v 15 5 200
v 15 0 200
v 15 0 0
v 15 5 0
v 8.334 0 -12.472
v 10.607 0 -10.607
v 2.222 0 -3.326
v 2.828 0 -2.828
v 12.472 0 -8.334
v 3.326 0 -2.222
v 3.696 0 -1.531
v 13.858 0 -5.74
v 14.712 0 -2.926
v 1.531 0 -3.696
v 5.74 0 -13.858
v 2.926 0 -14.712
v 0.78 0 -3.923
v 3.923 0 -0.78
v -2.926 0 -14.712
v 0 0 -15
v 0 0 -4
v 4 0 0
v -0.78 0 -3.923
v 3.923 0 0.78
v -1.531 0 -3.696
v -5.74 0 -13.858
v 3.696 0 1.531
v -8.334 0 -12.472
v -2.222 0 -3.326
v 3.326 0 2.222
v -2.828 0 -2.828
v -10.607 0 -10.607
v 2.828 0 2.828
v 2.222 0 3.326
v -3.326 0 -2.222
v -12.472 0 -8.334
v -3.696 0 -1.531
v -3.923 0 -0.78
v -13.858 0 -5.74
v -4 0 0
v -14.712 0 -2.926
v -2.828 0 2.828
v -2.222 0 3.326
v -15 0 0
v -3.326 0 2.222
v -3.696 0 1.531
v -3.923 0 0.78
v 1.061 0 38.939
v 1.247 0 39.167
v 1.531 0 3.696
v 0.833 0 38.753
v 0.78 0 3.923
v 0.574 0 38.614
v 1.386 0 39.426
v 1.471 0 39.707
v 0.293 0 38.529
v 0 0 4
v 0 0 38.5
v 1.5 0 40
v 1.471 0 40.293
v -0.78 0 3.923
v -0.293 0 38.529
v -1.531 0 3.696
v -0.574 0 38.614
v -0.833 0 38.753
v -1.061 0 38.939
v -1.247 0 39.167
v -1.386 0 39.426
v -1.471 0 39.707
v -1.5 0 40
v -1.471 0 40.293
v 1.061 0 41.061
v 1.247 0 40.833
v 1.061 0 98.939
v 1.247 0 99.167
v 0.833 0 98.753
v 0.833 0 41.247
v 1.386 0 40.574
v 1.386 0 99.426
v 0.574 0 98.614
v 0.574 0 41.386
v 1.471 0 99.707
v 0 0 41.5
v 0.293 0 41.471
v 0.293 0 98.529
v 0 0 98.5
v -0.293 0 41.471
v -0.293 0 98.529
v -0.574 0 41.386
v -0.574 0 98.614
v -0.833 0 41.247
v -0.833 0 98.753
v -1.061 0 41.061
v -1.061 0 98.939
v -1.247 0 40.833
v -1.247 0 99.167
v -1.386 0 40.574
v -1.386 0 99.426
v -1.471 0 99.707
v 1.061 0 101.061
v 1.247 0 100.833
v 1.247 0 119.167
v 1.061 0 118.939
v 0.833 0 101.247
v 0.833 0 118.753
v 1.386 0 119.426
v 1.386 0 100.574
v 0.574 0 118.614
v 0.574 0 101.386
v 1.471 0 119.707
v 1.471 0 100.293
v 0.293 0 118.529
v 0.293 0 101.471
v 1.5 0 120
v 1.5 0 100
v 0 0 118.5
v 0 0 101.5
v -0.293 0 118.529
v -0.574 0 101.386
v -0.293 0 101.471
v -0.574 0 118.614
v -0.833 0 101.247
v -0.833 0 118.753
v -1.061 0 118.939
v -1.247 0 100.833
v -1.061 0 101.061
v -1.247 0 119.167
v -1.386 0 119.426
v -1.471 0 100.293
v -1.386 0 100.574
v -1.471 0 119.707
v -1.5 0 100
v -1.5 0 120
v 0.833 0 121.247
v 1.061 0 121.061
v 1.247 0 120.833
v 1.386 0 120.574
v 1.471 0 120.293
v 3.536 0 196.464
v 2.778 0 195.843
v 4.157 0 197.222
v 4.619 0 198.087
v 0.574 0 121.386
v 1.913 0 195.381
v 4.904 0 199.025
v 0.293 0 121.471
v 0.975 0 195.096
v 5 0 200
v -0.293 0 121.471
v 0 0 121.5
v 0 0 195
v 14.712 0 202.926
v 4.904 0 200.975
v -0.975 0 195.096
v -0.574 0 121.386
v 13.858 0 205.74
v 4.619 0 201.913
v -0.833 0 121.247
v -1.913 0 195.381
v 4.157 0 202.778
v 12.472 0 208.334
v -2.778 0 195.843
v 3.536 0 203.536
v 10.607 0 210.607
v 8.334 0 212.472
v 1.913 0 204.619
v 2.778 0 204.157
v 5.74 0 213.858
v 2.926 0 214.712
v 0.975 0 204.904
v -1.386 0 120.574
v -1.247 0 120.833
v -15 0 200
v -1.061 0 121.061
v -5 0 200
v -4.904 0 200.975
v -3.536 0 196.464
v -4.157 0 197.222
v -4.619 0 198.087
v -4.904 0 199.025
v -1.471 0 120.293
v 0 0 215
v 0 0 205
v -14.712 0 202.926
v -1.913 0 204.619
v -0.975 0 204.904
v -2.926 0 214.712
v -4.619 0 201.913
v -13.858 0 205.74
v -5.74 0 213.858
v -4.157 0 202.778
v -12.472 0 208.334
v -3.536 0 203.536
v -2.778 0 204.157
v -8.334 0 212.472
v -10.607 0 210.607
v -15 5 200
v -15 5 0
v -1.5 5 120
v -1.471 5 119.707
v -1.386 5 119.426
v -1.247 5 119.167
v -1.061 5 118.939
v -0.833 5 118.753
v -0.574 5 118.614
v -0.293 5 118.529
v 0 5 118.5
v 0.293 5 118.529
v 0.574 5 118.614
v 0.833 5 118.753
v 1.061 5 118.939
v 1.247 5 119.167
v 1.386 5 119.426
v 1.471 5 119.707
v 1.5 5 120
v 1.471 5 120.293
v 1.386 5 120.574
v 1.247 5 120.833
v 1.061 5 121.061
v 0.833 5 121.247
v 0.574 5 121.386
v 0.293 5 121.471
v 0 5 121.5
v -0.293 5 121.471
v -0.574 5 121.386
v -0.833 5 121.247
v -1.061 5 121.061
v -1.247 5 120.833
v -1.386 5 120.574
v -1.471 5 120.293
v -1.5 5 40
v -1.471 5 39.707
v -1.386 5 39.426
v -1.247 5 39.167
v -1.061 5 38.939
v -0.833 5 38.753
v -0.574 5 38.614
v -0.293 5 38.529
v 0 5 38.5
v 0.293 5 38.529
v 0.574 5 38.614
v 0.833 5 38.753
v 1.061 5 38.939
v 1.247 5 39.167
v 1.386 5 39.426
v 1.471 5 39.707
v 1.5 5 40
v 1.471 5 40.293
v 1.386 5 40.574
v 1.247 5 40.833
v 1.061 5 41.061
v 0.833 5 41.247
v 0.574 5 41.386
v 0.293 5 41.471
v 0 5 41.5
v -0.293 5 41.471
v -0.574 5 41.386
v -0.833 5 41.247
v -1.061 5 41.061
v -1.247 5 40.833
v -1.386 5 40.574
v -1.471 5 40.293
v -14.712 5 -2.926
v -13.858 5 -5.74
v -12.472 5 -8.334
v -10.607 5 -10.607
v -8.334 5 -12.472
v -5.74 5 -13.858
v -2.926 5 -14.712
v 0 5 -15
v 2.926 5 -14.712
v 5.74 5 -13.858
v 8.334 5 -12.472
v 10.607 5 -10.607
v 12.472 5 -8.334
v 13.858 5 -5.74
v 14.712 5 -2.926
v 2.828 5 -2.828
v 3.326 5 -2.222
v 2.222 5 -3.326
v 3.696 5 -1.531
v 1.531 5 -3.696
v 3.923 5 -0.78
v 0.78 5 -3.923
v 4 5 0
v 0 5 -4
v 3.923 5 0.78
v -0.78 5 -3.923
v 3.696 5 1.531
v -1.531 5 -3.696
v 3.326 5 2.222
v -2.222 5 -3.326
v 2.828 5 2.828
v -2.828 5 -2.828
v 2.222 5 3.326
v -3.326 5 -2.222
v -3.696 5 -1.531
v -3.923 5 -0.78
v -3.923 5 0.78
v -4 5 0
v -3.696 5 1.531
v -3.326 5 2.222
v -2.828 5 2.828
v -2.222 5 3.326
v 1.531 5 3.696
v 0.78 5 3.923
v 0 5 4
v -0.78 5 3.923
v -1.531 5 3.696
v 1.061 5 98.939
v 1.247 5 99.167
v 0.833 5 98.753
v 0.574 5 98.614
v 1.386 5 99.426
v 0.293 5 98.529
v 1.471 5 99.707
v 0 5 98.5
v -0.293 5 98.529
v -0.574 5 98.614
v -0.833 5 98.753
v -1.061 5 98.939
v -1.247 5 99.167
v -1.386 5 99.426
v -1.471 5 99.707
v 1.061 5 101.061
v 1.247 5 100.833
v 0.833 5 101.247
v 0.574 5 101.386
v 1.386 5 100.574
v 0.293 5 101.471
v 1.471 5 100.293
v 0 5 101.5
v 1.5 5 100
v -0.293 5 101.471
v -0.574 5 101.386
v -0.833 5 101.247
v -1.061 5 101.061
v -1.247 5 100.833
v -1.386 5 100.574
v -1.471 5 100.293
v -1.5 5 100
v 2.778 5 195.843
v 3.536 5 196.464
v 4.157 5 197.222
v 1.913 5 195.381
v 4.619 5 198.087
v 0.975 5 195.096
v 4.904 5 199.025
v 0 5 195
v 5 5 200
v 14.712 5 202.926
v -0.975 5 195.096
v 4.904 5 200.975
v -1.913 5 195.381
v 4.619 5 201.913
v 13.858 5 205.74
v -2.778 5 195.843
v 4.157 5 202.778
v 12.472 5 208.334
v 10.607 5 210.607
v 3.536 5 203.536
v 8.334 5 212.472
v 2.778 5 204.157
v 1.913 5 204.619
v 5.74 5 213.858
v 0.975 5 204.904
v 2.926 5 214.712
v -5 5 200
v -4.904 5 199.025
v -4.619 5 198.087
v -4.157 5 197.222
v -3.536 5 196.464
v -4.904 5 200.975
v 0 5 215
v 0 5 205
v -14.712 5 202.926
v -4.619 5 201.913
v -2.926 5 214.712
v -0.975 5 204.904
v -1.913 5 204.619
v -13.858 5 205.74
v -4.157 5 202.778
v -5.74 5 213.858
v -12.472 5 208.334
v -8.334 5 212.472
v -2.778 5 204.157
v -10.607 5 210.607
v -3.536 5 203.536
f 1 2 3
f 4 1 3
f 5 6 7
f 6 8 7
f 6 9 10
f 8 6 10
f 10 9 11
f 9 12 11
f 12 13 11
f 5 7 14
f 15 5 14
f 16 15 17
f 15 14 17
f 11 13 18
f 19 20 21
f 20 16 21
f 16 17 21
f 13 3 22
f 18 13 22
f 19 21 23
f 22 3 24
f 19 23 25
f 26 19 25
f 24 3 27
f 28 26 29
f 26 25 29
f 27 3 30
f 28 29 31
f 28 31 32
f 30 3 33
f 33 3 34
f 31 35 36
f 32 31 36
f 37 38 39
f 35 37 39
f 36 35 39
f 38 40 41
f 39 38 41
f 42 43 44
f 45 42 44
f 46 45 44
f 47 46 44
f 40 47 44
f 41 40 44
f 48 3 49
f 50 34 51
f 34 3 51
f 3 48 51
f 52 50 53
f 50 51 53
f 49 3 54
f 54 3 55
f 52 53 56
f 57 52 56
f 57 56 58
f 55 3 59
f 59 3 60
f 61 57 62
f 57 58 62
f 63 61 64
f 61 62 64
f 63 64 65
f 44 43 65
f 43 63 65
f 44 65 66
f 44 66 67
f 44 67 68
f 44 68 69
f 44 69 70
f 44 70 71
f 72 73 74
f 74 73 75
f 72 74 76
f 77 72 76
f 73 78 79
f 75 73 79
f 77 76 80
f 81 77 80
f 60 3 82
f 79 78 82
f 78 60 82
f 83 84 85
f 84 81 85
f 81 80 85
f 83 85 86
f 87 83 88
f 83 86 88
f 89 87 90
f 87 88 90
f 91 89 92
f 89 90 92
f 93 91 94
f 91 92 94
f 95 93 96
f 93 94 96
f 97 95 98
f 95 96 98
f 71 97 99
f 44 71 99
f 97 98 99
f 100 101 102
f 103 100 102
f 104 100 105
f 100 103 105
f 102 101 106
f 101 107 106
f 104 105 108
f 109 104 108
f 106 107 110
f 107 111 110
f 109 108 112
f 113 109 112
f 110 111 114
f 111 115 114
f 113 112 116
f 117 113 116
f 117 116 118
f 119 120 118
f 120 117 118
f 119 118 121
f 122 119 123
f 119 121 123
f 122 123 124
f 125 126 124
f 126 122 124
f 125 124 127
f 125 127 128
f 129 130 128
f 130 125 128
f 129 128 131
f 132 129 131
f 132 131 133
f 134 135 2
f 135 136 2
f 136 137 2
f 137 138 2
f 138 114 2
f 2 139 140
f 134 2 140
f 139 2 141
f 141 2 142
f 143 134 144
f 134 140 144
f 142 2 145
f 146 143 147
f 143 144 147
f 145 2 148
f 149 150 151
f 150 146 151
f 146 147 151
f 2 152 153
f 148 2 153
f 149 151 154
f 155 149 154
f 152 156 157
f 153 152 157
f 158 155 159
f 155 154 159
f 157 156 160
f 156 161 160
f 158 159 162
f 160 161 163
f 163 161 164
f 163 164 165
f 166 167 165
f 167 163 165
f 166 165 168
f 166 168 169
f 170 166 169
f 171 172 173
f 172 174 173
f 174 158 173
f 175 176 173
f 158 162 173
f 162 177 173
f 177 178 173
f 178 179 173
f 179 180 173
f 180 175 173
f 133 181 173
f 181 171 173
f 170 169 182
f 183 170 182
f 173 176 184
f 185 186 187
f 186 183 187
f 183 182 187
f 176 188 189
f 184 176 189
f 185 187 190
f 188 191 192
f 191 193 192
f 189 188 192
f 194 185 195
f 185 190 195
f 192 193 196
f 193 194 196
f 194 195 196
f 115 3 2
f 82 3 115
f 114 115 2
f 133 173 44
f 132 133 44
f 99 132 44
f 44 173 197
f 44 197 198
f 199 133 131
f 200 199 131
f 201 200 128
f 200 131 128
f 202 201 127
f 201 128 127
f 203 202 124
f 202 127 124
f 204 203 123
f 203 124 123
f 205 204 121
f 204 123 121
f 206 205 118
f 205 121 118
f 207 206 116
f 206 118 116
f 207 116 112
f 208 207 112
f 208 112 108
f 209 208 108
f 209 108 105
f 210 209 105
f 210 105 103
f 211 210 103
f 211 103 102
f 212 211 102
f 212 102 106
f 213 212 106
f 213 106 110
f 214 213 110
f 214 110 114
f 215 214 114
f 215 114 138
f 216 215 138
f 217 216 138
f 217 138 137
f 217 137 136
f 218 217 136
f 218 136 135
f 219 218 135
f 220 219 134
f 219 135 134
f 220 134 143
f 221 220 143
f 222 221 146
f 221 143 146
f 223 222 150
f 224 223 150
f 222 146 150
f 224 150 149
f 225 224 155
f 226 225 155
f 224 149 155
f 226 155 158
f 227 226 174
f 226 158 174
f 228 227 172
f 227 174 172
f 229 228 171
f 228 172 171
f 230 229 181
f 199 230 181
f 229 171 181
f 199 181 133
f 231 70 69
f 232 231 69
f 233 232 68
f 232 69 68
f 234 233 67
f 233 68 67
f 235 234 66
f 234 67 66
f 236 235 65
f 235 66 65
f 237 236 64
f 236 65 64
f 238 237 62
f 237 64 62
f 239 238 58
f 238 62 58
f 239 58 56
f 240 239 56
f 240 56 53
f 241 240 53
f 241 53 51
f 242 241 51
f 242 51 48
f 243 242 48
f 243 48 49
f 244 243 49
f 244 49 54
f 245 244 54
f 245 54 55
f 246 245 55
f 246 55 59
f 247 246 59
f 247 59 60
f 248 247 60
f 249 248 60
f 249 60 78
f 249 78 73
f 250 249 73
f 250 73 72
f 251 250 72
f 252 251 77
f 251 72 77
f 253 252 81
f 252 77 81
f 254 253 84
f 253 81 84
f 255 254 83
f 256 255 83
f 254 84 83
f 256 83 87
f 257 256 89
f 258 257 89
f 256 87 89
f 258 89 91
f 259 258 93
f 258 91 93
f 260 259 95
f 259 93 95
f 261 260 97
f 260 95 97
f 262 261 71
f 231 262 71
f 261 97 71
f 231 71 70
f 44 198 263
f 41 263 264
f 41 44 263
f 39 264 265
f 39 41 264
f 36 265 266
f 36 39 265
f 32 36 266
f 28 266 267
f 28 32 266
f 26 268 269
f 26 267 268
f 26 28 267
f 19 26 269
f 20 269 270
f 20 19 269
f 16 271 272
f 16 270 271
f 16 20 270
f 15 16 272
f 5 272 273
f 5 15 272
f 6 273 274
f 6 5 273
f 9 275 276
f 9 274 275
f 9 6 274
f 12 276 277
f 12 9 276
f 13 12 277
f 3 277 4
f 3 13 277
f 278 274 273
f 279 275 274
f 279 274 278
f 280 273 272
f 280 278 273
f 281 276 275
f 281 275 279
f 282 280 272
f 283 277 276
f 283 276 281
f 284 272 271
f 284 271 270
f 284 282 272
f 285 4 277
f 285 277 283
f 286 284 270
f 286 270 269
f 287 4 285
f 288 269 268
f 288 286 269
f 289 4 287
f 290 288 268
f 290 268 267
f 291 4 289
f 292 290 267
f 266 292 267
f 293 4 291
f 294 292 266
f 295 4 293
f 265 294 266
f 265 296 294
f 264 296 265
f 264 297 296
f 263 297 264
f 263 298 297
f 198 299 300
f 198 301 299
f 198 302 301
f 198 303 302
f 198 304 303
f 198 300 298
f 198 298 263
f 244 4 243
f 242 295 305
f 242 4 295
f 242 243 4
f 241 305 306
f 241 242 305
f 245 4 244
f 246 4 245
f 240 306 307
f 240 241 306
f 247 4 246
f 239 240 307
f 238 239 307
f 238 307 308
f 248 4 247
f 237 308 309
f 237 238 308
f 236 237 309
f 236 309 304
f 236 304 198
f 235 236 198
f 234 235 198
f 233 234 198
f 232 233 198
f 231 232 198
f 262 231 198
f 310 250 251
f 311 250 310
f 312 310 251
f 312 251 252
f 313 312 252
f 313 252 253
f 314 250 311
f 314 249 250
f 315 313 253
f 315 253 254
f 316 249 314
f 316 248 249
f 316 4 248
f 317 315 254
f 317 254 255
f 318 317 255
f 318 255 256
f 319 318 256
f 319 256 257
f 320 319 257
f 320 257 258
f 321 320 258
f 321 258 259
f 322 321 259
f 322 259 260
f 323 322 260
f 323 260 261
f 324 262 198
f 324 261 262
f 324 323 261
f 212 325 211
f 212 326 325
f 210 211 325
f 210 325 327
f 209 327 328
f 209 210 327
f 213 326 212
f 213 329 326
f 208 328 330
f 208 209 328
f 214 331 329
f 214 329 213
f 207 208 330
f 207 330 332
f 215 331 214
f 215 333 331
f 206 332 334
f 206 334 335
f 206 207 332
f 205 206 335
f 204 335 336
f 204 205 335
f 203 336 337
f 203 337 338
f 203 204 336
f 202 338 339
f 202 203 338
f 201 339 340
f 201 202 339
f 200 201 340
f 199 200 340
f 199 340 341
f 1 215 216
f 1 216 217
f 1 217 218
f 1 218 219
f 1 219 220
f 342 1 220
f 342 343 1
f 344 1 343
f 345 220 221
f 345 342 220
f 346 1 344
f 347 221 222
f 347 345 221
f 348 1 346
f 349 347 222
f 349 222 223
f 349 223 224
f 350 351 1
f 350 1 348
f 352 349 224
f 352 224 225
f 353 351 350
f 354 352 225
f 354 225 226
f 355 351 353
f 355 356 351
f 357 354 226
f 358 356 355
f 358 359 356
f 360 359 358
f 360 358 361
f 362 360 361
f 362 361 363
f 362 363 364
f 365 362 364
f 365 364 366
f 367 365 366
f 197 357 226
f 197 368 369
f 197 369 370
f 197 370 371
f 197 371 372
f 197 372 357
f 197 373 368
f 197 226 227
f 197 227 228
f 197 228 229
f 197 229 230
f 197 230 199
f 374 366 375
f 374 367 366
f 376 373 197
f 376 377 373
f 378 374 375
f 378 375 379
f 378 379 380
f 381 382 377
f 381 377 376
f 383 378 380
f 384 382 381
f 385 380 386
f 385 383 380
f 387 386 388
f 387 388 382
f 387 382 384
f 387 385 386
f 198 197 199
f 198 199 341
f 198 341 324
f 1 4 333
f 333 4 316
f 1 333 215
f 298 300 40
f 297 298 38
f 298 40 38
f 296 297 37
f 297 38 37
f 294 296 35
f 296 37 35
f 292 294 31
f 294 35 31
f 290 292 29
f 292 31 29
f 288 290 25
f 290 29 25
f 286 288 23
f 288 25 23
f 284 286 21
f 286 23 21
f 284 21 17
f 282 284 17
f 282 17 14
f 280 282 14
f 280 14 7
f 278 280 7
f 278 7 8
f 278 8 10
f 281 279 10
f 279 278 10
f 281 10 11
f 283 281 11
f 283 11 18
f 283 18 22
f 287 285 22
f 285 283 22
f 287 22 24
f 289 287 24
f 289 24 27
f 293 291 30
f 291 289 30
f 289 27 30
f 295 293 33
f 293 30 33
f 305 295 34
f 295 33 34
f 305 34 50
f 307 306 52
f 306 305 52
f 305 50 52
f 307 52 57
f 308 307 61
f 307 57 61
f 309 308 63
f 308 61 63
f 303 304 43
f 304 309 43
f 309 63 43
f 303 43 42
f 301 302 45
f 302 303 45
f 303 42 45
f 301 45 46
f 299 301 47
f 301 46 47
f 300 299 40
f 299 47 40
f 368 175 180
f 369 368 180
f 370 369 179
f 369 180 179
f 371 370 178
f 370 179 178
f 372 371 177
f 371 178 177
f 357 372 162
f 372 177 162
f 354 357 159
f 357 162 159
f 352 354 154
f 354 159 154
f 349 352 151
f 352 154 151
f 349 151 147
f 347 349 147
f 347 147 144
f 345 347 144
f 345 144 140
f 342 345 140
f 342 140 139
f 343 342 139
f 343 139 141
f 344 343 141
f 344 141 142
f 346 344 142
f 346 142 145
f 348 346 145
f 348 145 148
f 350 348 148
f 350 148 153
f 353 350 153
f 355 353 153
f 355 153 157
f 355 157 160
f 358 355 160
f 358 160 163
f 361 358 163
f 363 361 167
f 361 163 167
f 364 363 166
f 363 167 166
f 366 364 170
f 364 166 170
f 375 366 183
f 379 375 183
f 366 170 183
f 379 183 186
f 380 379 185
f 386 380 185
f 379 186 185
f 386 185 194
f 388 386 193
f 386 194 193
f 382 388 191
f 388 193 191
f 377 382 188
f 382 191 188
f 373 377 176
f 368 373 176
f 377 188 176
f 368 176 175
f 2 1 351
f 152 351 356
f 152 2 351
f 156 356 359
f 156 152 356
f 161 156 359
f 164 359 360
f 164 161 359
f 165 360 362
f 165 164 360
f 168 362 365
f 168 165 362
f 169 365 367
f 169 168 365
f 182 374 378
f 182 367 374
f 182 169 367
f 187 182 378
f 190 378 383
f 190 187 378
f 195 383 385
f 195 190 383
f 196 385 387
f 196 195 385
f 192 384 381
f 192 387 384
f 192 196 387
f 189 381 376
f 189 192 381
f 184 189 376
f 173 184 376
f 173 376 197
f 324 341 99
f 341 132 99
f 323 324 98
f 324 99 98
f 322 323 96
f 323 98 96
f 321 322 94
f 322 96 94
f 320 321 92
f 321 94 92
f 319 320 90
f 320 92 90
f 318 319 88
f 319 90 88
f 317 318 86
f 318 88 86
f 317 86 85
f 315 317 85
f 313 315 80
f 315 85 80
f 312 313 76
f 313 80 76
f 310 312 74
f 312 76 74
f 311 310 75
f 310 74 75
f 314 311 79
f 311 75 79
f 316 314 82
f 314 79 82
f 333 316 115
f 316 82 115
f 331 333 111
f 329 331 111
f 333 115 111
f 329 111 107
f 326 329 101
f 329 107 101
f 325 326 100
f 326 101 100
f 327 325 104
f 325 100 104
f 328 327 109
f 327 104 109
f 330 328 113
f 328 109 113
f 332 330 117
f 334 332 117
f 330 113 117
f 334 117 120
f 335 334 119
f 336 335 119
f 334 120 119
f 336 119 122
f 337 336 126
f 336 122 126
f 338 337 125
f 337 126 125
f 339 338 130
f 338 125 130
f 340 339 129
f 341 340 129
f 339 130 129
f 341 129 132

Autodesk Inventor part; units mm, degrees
ref_plane "YZ Plane" through (0, 0, 0) normal (1, 0, 0) x (0, 1, 0)
ref_plane "XZ Plane" through (0, 0, 0) normal (0, 1, 0) x (-1, 0, 0)
ref_plane "XY Plane" through (0, 0, 0) normal (0, 0, 1) x (1, 0, 0)
sketch "Sketch1" plane through (0, 0, 0) normal (0, 1, 0) x (-1, 0, 0)
  circle A0 centre (0, 0) radius 4
  circle A1 centre (0, 200) radius 15
  circle A2 centre (0, 200) radius 5
  circle A3 centre (0, 0) radius 15
  line L0 (15, 200) -> (15, 0)
  line L1 (-15, 200) -> (-15, 0)
  line L2 (0, 160) -> (0, 110) construction
  line L3 (4, 160) -> (4, 110)
  line L4 (-4, 110) -> (-4, 160)
  arc A4 (4, 160) -> (-4, 160) centre (0, 160) ccw
  arc A5 (-4, 110) -> (4, 110) centre (0, 110) ccw
  line L5 (0, -61) -> (0, 261) projected
  line L6 (4, 90) -> (4, 40)
  arc A6 (4, 90) -> (-4, 90) centre (0, 90) ccw
  line L7 (-4, 40) -> (-4, 90)
  arc A7 (-4, 40) -> (4, 40) centre (0, 40) ccw
  circle A8 centre (0, 175) radius 1.5
  circle A9 centre (0, 100) radius 1.5
  circle A10 centre (0, 120) radius 1.5
  circle A11 centre (0, 40) radius 1.5
  point P0 (0, 135)
  point P1 (-7, 0)
  point P2 (7, 0)
  point P3 (0, 121.5)
  point P4 (0, 118.5)
  dimension "d0" = 8
  dimension "d1" = 30
  dimension "d2" = 200
  dimension "d3" = 10
  dimension "d4" = 30
  dimension "d16" = 8
  dimension "d18" = 50
  dimension "d20" = 14
  dimension "d21" = 7
  dimension "d31" = 65
  dimension "d34" = 70
  dimension "d39" = 40
  dimension "d40" = 40
  dimension "d41" = 75
  dimension "d44" = 3
  dimension "d45" = 3
  dimension "d46" = 3
  dimension "d47" = 25
  dimension "d48" = 3
  dimension "d50" = 40
  dimension "d51" = 100
  dimension "d52" = 120
extrude "Extrusion1" add sketch "Sketch1" along normal blind 5 contours A0 L5 A3 | A0 L5 A3 | L5 A7 L6 A6 A9 A5 L3 A4 A8 A1 L0 A3 | A3 L1 A1 L5 A8 A4 L4 A5 A9 A6 L7 A7 | A7 L7 A6 L5 A11 | L5 A11 A6 L6 A7 | A1 L5 A2 | A1 L5 A2 | A8 L5 | L5 A8 | L5 A10 A5 L4 A4 | A4 L3 A5 L5 A10
properties part number "Canh_Tay_1" material "Nylon 6/6"
